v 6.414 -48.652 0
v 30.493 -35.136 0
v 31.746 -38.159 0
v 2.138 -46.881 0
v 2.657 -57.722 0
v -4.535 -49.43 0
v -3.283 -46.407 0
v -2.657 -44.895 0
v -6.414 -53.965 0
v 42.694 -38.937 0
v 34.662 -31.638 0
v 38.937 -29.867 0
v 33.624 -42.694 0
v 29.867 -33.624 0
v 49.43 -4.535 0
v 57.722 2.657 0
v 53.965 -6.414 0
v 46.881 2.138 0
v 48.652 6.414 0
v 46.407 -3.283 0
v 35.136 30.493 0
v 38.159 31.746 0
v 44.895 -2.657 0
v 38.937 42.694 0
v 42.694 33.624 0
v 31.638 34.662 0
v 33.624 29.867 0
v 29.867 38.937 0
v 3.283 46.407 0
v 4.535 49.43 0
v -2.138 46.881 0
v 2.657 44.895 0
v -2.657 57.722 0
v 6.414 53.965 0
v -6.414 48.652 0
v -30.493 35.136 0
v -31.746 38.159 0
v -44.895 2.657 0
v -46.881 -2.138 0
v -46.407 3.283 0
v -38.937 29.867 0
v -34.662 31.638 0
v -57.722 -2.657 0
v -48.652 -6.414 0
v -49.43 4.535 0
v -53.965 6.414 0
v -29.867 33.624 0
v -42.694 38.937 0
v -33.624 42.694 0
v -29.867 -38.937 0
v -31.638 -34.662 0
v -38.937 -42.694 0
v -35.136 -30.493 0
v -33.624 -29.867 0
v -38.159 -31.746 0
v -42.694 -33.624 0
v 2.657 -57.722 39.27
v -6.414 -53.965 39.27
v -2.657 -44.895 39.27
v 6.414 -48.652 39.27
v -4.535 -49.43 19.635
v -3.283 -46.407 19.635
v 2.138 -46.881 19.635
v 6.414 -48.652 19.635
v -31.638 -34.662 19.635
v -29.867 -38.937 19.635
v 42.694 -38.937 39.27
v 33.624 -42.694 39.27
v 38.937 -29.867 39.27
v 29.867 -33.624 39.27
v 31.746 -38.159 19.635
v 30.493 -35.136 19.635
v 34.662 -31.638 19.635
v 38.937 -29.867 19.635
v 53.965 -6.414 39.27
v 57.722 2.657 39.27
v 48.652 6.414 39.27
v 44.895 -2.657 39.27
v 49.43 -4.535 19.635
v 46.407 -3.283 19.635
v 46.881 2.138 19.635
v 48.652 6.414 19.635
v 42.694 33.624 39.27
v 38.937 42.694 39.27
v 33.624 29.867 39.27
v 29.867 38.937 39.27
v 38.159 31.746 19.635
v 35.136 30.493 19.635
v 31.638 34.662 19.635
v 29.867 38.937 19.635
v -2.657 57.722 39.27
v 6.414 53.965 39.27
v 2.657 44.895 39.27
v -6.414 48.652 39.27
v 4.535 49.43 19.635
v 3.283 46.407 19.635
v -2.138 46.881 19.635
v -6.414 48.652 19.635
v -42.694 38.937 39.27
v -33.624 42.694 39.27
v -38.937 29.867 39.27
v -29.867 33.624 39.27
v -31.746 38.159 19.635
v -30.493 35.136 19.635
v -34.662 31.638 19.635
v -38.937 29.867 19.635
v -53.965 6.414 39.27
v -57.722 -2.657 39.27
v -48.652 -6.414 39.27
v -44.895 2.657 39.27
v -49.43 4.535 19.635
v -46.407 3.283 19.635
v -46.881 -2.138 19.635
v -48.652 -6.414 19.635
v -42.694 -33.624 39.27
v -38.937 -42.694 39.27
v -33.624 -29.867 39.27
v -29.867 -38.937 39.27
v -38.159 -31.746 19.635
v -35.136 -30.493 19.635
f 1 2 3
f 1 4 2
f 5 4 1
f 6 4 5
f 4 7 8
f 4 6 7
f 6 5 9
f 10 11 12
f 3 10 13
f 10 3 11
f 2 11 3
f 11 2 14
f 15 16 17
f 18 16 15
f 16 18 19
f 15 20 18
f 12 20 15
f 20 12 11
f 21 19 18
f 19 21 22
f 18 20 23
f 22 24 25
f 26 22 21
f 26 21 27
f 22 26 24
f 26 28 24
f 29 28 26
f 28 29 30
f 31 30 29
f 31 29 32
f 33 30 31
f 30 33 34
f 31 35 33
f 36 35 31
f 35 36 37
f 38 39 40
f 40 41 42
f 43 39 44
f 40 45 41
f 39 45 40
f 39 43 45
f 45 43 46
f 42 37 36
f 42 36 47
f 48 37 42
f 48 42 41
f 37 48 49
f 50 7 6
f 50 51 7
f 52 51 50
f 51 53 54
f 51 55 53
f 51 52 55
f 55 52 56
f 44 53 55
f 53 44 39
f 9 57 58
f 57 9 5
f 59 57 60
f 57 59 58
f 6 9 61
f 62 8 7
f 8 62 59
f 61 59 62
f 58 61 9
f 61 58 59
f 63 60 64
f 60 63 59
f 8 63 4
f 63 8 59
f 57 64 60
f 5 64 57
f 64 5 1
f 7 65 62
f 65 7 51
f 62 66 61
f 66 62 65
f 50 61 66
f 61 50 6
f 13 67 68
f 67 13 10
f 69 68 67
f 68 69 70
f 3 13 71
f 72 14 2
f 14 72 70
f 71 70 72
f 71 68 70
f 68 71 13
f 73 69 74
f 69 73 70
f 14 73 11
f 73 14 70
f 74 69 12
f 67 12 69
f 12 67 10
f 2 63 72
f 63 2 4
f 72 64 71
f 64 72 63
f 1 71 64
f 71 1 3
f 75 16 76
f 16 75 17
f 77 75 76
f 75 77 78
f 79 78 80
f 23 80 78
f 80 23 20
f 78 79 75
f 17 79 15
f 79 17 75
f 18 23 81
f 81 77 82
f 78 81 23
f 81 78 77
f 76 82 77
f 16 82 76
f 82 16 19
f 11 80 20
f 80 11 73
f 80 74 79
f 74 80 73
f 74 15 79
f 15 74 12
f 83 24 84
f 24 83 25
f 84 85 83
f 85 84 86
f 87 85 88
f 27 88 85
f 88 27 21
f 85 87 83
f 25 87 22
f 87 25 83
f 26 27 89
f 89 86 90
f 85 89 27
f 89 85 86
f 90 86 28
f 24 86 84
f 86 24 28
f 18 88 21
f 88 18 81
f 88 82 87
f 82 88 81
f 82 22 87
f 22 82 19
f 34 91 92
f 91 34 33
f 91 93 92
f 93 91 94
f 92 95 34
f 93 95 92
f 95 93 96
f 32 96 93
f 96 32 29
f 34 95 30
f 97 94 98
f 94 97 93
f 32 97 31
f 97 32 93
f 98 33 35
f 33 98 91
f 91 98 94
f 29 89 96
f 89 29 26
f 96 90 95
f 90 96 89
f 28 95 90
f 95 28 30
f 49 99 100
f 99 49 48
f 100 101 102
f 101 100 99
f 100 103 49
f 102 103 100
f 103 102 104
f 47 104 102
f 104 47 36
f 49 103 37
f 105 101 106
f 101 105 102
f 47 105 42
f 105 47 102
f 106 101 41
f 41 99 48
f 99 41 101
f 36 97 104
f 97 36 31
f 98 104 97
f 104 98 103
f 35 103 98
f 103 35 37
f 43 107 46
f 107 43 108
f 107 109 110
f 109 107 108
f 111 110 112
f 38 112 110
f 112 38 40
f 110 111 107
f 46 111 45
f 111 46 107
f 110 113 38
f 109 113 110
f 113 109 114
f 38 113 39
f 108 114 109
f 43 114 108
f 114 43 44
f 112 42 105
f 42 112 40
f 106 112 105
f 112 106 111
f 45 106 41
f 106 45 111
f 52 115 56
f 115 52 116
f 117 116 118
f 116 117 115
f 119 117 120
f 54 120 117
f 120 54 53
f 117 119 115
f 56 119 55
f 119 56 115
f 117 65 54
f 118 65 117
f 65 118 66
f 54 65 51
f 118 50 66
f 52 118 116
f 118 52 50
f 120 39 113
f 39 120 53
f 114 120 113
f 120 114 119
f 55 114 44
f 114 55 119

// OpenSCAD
//!OpenSCAD


module torre_pared() {
  union(){
    linear_extrude( height=pared, twist=0, scale=[1, 1], center=false){
      square([torre, torre], center=true);
    }
    cube([(torre / 3), pared, (pared / 2)], center=false);
  }
}


lados = 8;
distancia_centro = 50;
pared = ((2 * 3.14159) * distancia_centro) / lados;
torre = pared / 4;
angulo_central = 360 / lados;
angulo_interior = 180 - angulo_central;

for (torre = [0 : abs(1) : lados - 1]) {
  rotate([0, 0, (torre * angulo_central)]){
    translate([0, ((pared / -2) / cos((angulo_interior / 2))), 0]){
      rotate([0, 0, (angulo_interior / 2)]){
        torre_pared();
      }
    }
  }
}
